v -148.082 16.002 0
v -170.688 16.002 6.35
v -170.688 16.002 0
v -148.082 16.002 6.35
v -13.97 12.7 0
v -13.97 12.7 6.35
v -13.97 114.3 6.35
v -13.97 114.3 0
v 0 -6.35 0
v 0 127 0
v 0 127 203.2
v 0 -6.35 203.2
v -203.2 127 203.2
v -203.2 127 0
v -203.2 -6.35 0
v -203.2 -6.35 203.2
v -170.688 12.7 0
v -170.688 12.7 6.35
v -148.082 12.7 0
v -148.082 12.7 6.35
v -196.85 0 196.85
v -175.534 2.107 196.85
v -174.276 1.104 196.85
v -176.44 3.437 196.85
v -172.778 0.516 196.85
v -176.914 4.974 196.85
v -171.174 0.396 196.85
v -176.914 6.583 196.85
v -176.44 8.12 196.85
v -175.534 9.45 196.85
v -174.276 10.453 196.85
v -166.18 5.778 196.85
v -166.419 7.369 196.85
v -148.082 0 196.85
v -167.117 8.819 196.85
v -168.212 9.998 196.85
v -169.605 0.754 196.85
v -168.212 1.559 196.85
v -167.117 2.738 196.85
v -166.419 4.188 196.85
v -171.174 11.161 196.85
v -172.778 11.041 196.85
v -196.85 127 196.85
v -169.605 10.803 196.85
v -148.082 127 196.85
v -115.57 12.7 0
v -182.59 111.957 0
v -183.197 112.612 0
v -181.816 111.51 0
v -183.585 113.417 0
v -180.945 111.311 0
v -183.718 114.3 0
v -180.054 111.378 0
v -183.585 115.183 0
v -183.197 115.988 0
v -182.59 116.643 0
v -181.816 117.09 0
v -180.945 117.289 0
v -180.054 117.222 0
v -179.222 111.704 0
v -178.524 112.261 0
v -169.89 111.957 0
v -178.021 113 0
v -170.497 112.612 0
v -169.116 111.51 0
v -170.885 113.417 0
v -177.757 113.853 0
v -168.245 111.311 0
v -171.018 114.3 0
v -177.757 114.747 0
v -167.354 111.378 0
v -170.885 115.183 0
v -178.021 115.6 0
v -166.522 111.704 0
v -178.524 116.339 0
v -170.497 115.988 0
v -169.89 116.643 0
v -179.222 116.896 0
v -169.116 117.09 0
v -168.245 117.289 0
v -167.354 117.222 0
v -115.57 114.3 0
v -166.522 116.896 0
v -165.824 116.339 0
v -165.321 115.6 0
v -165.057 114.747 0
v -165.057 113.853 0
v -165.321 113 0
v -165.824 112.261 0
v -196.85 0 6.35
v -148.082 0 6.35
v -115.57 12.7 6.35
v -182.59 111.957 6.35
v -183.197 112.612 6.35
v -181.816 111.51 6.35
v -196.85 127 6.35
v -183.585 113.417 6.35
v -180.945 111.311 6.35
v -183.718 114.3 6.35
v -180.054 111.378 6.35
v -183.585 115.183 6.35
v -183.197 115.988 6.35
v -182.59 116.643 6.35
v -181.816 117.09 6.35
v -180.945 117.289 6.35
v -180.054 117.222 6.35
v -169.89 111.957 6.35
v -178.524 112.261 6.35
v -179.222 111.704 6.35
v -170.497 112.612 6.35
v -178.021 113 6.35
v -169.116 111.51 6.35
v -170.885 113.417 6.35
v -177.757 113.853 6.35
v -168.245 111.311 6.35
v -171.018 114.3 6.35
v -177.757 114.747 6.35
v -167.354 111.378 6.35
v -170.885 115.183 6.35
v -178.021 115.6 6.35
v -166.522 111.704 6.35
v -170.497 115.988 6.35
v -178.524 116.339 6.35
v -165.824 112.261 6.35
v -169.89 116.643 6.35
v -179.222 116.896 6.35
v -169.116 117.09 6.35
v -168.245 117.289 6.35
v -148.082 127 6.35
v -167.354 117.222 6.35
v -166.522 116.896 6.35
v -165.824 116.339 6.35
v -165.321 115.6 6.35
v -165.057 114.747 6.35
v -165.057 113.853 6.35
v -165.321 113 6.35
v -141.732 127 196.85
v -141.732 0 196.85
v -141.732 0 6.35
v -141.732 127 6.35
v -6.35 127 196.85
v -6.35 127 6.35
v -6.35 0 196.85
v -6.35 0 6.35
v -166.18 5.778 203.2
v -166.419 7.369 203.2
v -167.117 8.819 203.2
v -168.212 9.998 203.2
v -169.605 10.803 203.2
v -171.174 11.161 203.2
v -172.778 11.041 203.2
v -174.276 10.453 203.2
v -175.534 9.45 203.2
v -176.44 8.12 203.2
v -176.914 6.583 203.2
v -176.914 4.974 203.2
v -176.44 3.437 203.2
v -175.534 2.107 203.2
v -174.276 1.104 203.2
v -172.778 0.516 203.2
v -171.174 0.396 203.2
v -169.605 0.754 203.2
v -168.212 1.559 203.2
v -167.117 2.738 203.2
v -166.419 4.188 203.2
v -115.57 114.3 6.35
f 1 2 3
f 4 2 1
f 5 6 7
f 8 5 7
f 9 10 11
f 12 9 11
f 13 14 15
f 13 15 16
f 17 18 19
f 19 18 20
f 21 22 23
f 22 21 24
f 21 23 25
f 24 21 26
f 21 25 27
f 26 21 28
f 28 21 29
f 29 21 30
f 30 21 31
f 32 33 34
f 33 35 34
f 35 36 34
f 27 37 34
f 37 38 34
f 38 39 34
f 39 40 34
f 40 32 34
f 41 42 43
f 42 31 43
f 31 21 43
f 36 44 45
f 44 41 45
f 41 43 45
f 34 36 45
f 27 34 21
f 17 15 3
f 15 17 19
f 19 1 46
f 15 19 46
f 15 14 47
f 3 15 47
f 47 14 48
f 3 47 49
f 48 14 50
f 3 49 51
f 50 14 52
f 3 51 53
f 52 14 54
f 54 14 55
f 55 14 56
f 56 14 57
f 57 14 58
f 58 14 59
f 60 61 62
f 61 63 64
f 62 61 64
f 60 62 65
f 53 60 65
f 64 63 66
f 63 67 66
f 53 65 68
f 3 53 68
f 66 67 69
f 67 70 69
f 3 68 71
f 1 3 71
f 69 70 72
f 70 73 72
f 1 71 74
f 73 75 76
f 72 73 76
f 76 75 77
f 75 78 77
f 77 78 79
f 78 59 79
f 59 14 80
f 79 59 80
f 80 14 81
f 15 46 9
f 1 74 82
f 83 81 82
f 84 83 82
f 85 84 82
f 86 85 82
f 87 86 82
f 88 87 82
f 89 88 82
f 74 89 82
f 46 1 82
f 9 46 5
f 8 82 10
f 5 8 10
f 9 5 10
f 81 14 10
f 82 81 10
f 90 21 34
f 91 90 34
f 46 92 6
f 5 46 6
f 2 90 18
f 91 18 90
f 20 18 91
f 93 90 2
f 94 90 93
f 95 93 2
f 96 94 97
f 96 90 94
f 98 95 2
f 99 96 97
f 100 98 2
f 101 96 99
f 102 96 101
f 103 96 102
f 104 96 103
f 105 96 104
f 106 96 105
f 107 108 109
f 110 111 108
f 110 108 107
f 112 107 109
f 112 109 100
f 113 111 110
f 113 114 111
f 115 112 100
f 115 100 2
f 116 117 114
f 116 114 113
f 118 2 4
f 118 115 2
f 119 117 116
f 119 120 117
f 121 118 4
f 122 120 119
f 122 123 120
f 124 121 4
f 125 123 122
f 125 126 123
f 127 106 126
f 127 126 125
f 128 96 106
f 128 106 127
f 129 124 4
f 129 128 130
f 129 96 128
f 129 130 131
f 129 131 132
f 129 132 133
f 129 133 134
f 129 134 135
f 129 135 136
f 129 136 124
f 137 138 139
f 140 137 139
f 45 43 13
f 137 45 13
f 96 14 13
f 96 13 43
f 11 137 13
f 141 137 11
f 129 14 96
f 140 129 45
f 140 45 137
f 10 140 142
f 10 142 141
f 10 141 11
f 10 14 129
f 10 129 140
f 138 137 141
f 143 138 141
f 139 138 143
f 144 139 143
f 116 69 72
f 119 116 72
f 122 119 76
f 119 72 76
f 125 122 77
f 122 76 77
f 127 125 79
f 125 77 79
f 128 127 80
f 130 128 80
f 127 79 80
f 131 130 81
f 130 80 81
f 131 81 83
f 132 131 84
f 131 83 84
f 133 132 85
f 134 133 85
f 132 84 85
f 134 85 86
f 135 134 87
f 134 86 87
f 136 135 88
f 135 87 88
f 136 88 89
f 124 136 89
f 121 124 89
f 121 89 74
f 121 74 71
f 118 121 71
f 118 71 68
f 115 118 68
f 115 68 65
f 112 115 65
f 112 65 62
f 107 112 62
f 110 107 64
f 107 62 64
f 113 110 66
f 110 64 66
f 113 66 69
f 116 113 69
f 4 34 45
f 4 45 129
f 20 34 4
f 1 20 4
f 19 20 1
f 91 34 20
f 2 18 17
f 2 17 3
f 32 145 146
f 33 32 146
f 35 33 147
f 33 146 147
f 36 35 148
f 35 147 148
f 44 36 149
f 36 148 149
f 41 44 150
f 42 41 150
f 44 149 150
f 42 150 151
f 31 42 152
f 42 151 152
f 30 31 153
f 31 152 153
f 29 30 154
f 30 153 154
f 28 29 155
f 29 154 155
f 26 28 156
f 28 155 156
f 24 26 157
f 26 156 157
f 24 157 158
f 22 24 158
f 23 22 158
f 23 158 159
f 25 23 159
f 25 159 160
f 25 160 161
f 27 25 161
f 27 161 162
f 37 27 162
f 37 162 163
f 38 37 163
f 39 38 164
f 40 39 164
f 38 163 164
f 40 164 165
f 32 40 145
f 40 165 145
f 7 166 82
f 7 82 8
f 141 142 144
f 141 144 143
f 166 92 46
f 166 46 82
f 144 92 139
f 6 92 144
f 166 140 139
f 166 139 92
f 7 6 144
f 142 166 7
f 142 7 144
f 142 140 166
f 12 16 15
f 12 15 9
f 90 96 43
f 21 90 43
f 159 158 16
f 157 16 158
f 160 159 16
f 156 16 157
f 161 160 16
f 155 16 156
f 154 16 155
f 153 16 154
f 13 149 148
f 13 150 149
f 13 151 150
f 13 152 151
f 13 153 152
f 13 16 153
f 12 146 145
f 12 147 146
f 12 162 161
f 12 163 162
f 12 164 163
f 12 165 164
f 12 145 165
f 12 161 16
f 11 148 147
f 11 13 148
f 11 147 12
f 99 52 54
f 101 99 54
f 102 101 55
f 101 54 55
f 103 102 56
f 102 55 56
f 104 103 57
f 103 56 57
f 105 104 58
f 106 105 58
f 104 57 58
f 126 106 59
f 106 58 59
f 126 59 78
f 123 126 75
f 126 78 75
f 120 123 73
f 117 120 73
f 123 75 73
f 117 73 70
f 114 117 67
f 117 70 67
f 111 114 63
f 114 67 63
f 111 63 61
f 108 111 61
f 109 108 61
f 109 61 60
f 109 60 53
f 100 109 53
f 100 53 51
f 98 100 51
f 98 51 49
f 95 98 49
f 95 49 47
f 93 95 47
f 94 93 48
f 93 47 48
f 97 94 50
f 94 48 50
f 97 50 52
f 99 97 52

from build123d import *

# Parameters (mm, degrees)
SKETCH1_W           = 203.2
SKETCH1_H           = 127
BOSS_EXTRUDE1_DEPTH = 6.35
SKETCH2_W           = 101.6
SKETCH2_H           = 101.6
SKETCH2_W_2         = 22.606
SKETCH2_H_2         = 3.302
CUT_EXTRUDE1_DEPTH  = 6.35
SKETCH3_W           = 203.2
SKETCH3_H           = 203.2
BOSS_EXTRUDE2_DEPTH = 6.35
SKETCH4_W           = 196.85
SKETCH4_H           = 127
BOSS_EXTRUDE3_DEPTH = 6.35
SKETCH5_W           = 190.5
SKETCH5_H           = 127
BOSS_EXTRUDE4_DEPTH = 6.35
SKETCH7_W           = 6.35
SKETCH7_H           = 190.5
BOSS_EXTRUDE5_DEPTH = 127
SKETCH8_R           = 5.3975
CUT_EXTRUDE2_DEPTH  = 6.35
SKETCH9_R           = 2.9972
CUT_EXTRUDE3_DEPTH  = 6.35


with BuildPart() as part:
    # Sketch1 → Boss-Extrude1 (new body)
    with BuildSketch(Plane.XY):
        with Locations((-101.6, 63.5)):
            Rectangle(SKETCH1_W, SKETCH1_H)
    extrude(amount=BOSS_EXTRUDE1_DEPTH)

    # Sketch2 → Cut-Extrude1 (cut)
    with BuildSketch(Plane.XY.offset(6.35)):
        with Locations((-64.77, 63.5)):
            Rectangle(SKETCH2_W, SKETCH2_H)
        with Locations((-159.385, 14.351)):
            Rectangle(SKETCH2_W_2, SKETCH2_H_2)
    extrude(amount=-CUT_EXTRUDE1_DEPTH, mode=Mode.SUBTRACT)

    # Sketch3 → Boss-Extrude2 (add)
    with BuildSketch(Plane.XZ):
        with Locations((-101.6, 101.6)):
            Rectangle(SKETCH3_W, SKETCH3_H)
    extrude(amount=BOSS_EXTRUDE2_DEPTH)

    # Sketch4 → Boss-Extrude3 (add)
    with BuildSketch(Plane.ZY.offset(203.2)):
        with Locations((104.775, 63.5)):
            Rectangle(SKETCH4_W, SKETCH4_H)
    boss_extrude3 = extrude(amount=-BOSS_EXTRUDE3_DEPTH)

    # Mirror1: Boss-Extrude3 across plane
    add(boss_extrude3.mirror(Plane(origin=(-101.6, 0, 0), x_dir=(0, 0, 1), z_dir=(1, 0, 0))))

    # Sketch5 → Boss-Extrude4 (add)
    with BuildSketch(Plane.XY.offset(203.2)):
        with Locations((-101.6, 63.5)):
            Rectangle(SKETCH5_W, SKETCH5_H)
    extrude(amount=-BOSS_EXTRUDE4_DEPTH)

    # Sketch7 → Boss-Extrude5 (add)
    with BuildSketch(Plane(origin=(0, 0, 0), x_dir=(1, 0, 0), z_dir=(0, 1, 0))):
        with Locations((-144.907, -101.6)):
            Rectangle(SKETCH7_W, SKETCH7_H)
    extrude(amount=BOSS_EXTRUDE5_DEPTH)

    # Sketch8 → Cut-Extrude2 (cut)
    with BuildSketch(Plane.XY.offset(203.2)):
        with Locations((-171.577, 5.7785)):
            Circle(SKETCH8_R)
    extrude(amount=-CUT_EXTRUDE2_DEPTH, mode=Mode.SUBTRACT)

    # Sketch9 → Cut-Extrude3 (cut)
    with BuildSketch(Plane(origin=(0, 0, 0), x_dir=(-1, 0, 0), z_dir=(0, 0, -1))):
        with Locations((168.021, 114.3)):
            Circle(SKETCH9_R)
        with Locations((180.721, 114.3)):
            Circle(SKETCH9_R)
    extrude(amount=-CUT_EXTRUDE3_DEPTH, mode=Mode.SUBTRACT)


solid = part.part
